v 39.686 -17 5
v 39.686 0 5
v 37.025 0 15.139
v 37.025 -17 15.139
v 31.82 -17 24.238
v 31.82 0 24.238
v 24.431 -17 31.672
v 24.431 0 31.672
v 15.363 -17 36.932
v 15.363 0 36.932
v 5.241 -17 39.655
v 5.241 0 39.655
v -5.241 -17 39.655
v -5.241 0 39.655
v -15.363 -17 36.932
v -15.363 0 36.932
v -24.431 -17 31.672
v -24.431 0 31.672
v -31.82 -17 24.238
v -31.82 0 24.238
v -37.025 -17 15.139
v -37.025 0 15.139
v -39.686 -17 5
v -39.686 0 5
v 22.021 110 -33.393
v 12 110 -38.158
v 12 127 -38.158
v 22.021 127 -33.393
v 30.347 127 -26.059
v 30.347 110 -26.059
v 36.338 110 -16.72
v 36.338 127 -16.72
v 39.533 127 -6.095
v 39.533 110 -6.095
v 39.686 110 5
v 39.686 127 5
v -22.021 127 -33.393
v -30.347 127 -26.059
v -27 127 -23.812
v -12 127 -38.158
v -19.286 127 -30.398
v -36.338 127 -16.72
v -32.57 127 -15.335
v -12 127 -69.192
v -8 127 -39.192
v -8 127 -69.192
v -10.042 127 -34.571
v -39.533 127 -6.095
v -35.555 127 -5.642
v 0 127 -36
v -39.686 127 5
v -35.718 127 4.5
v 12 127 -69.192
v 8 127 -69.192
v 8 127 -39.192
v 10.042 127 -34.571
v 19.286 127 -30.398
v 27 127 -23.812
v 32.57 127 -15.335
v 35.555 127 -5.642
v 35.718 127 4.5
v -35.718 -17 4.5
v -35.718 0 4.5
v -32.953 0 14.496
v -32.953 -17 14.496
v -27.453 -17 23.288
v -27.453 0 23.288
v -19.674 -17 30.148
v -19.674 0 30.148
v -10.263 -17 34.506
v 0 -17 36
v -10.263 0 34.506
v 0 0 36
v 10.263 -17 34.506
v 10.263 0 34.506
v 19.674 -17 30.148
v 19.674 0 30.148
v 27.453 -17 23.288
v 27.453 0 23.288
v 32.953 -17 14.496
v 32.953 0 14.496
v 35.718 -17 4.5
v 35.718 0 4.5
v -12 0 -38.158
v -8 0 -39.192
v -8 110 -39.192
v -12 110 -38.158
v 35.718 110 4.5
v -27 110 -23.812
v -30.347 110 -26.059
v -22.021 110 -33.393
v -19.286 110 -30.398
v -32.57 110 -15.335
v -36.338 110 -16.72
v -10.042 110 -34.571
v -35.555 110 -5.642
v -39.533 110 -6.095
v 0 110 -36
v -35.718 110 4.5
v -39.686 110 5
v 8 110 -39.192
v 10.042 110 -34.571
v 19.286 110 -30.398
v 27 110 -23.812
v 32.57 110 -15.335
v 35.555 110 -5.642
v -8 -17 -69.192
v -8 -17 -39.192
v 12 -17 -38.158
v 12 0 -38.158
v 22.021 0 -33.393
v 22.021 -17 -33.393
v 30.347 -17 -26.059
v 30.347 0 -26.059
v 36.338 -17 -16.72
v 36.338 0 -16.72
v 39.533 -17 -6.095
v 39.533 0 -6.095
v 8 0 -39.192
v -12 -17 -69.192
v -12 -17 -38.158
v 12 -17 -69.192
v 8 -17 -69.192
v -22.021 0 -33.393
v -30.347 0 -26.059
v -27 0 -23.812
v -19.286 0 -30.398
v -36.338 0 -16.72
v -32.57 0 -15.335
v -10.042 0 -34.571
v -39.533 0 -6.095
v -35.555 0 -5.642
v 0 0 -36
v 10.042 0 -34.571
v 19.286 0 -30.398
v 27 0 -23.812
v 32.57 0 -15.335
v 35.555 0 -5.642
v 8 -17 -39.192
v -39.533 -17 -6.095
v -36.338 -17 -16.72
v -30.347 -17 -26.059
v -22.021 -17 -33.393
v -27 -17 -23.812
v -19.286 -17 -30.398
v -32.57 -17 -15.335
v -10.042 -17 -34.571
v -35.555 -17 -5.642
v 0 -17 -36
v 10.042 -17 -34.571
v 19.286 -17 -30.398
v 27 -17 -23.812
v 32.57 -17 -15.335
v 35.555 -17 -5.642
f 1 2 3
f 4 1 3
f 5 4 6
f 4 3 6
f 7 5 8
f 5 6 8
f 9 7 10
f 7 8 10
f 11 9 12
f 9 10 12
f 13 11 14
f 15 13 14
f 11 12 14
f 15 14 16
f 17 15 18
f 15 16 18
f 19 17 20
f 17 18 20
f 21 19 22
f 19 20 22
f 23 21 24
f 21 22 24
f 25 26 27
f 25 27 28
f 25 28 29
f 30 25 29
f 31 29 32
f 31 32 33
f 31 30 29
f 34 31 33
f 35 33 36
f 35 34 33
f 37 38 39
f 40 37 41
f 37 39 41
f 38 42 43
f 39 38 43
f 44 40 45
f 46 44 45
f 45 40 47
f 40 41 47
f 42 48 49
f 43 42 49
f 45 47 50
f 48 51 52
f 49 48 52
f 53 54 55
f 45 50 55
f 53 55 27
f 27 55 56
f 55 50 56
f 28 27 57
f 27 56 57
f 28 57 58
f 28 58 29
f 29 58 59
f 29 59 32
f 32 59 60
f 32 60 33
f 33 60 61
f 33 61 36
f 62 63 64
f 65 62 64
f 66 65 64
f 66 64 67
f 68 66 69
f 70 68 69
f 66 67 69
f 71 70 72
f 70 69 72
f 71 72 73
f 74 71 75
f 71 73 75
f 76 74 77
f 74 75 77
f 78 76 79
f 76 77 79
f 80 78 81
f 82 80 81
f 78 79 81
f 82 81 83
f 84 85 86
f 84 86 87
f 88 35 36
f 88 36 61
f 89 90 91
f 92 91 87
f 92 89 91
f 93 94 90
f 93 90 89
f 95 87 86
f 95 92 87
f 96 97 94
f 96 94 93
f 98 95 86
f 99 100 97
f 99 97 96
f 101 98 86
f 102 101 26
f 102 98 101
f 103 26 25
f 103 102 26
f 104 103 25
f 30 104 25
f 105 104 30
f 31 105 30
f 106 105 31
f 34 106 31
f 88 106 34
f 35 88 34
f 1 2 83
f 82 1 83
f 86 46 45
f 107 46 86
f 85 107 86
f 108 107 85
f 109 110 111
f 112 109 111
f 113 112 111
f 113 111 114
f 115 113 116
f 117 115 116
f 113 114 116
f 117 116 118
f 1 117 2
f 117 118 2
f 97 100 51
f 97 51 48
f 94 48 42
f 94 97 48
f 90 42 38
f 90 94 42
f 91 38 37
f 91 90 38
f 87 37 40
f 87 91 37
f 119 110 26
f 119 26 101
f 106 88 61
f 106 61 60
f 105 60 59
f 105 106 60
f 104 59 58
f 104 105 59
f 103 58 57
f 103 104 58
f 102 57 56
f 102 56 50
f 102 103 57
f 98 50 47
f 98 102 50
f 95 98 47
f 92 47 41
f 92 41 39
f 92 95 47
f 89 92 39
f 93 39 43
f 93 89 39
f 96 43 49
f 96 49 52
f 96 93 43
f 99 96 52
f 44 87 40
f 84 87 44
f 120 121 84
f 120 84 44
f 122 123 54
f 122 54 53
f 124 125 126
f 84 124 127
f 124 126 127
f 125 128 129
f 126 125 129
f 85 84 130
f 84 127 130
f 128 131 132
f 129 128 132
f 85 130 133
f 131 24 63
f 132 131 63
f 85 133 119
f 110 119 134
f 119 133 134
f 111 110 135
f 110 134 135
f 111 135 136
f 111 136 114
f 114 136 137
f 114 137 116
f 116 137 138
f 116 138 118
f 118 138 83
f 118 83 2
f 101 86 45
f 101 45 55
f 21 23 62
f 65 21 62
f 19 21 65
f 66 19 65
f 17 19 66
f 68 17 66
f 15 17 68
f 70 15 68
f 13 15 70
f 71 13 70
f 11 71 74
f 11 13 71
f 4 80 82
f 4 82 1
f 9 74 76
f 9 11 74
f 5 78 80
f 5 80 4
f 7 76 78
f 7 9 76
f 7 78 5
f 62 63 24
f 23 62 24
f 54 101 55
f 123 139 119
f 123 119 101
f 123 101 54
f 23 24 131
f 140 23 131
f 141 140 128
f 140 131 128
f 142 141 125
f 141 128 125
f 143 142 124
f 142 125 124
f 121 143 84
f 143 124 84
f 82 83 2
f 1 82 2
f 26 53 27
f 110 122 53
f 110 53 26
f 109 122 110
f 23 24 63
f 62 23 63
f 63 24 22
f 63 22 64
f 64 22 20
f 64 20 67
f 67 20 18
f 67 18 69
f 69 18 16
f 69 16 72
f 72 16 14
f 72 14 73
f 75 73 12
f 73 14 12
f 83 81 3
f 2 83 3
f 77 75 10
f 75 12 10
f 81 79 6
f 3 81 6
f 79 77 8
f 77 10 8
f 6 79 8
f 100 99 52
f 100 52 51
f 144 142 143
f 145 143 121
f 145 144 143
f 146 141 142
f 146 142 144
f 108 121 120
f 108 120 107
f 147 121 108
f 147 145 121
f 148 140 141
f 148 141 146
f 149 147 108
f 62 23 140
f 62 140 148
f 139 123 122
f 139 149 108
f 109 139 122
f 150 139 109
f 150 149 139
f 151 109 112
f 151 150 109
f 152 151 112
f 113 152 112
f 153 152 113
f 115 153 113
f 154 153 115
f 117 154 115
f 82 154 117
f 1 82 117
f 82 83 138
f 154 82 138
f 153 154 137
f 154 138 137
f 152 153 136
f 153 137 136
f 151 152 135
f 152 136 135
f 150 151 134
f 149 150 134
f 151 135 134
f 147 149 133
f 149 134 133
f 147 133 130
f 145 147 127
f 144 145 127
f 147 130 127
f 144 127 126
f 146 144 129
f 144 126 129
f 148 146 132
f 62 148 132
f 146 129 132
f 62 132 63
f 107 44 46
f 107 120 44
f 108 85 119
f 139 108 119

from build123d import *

# Parameters (mm, degrees)
F2_DEPTH = 17
F4_DEPTH = 110
F7_DEPTH = 17


with BuildPart() as f2:
    # F1 (on face) → F2 (new body)
    with BuildSketch(Plane.XZ):
        with BuildLine():
            Line((-8, -69.1918358845), (-8, -39.1918358845))
            Line((-8, -39.1918358845), (8, -39.1918358845))
            Line((8, -39.1918358845), (8, -69.1918358845))
            Line((8, -69.1918358845), (12, -69.1918358845))
            Line((12, -69.1918358845), (12, -38.1575680567))
            ThreePointArc((12, -38.1575680567), (33.6676630929, -21.5983439611), (39.686269666, 5))
            Line((39.686269666, 5), (35.7176426994, 4.5))
            ThreePointArc((35.7176426994, 4.5), (0, -36), (-35.7176426994, 4.5))
            Line((-35.7176426994, 4.5), (-39.686269666, 5))
            ThreePointArc((-39.686269666, 5), (-33.6676630929, -21.5983439611), (-12, -38.1575680567))
            Line((-12, -38.1575680567), (-12, -69.1918358845))
            Line((-12, -69.1918358845), (-8, -69.1918358845))
        make_face()
    extrude(amount=F2_DEPTH)

    # F3 (on Front) → F4 (join)
    with BuildSketch(Plane.XZ):
        Polygon((8, -69.1918358845), (12, -69.1918358845), (12, -38.1575680567), (8, -39.1918358845), align=None)
        Polygon((-8, -69.1918358845), (-8, -39.1918358845), (-12, -38.1575680567), (-12, -69.1918358845), align=None)
    extrude(amount=-F4_DEPTH)

    # F6 (on offset) → F7 (join)
    with BuildSketch(Plane.XZ.offset(-110)):
        with BuildLine():
            Line((-8, -69.1918358845), (-8, -39.1918358845))
            Line((-8, -39.1918358845), (8, -39.1918358845))
            Line((8, -39.1918358845), (8, -69.1918358845))
            Line((8, -69.1918358845), (12, -69.1918358845))
            Line((12, -69.1918358845), (12, -38.1575680567))
            ThreePointArc((12, -38.1575680567), (33.6676630929, -21.5983439611), (39.686269666, 5))
            Line((39.686269666, 5), (35.7176426994, 4.5))
            ThreePointArc((35.7176426994, 4.5), (0, -36), (-35.7176426994, 4.5))
            Line((-35.7176426994, 4.5), (-39.686269666, 5))
            ThreePointArc((-39.686269666, 5), (-33.6676630929, -21.5983439611), (-12, -38.1575680567))
            Line((-12, -38.1575680567), (-12, -69.1918358845))
            Line((-12, -69.1918358845), (-8, -69.1918358845))
        make_face()
    extrude(amount=-F7_DEPTH)


with BuildPart() as f2b:
    # F0 (on Front) → F2, piece 2 (new body)
    with BuildSketch(Plane.XZ):
        with BuildLine():
            Line((-39.686269666, 5), (-35.7176426994, 4.5))
            ThreePointArc((-35.7176426994, 4.5), (0, 36), (35.7176426994, 4.5))
            Line((35.7176426994, 4.5), (39.686269666, 5))
            ThreePointArc((39.686269666, 5), (0, 40), (-39.686269666, 5))
        make_face()
    extrude(amount=F2_DEPTH)


solid = Compound([f2.part, f2b.part])
